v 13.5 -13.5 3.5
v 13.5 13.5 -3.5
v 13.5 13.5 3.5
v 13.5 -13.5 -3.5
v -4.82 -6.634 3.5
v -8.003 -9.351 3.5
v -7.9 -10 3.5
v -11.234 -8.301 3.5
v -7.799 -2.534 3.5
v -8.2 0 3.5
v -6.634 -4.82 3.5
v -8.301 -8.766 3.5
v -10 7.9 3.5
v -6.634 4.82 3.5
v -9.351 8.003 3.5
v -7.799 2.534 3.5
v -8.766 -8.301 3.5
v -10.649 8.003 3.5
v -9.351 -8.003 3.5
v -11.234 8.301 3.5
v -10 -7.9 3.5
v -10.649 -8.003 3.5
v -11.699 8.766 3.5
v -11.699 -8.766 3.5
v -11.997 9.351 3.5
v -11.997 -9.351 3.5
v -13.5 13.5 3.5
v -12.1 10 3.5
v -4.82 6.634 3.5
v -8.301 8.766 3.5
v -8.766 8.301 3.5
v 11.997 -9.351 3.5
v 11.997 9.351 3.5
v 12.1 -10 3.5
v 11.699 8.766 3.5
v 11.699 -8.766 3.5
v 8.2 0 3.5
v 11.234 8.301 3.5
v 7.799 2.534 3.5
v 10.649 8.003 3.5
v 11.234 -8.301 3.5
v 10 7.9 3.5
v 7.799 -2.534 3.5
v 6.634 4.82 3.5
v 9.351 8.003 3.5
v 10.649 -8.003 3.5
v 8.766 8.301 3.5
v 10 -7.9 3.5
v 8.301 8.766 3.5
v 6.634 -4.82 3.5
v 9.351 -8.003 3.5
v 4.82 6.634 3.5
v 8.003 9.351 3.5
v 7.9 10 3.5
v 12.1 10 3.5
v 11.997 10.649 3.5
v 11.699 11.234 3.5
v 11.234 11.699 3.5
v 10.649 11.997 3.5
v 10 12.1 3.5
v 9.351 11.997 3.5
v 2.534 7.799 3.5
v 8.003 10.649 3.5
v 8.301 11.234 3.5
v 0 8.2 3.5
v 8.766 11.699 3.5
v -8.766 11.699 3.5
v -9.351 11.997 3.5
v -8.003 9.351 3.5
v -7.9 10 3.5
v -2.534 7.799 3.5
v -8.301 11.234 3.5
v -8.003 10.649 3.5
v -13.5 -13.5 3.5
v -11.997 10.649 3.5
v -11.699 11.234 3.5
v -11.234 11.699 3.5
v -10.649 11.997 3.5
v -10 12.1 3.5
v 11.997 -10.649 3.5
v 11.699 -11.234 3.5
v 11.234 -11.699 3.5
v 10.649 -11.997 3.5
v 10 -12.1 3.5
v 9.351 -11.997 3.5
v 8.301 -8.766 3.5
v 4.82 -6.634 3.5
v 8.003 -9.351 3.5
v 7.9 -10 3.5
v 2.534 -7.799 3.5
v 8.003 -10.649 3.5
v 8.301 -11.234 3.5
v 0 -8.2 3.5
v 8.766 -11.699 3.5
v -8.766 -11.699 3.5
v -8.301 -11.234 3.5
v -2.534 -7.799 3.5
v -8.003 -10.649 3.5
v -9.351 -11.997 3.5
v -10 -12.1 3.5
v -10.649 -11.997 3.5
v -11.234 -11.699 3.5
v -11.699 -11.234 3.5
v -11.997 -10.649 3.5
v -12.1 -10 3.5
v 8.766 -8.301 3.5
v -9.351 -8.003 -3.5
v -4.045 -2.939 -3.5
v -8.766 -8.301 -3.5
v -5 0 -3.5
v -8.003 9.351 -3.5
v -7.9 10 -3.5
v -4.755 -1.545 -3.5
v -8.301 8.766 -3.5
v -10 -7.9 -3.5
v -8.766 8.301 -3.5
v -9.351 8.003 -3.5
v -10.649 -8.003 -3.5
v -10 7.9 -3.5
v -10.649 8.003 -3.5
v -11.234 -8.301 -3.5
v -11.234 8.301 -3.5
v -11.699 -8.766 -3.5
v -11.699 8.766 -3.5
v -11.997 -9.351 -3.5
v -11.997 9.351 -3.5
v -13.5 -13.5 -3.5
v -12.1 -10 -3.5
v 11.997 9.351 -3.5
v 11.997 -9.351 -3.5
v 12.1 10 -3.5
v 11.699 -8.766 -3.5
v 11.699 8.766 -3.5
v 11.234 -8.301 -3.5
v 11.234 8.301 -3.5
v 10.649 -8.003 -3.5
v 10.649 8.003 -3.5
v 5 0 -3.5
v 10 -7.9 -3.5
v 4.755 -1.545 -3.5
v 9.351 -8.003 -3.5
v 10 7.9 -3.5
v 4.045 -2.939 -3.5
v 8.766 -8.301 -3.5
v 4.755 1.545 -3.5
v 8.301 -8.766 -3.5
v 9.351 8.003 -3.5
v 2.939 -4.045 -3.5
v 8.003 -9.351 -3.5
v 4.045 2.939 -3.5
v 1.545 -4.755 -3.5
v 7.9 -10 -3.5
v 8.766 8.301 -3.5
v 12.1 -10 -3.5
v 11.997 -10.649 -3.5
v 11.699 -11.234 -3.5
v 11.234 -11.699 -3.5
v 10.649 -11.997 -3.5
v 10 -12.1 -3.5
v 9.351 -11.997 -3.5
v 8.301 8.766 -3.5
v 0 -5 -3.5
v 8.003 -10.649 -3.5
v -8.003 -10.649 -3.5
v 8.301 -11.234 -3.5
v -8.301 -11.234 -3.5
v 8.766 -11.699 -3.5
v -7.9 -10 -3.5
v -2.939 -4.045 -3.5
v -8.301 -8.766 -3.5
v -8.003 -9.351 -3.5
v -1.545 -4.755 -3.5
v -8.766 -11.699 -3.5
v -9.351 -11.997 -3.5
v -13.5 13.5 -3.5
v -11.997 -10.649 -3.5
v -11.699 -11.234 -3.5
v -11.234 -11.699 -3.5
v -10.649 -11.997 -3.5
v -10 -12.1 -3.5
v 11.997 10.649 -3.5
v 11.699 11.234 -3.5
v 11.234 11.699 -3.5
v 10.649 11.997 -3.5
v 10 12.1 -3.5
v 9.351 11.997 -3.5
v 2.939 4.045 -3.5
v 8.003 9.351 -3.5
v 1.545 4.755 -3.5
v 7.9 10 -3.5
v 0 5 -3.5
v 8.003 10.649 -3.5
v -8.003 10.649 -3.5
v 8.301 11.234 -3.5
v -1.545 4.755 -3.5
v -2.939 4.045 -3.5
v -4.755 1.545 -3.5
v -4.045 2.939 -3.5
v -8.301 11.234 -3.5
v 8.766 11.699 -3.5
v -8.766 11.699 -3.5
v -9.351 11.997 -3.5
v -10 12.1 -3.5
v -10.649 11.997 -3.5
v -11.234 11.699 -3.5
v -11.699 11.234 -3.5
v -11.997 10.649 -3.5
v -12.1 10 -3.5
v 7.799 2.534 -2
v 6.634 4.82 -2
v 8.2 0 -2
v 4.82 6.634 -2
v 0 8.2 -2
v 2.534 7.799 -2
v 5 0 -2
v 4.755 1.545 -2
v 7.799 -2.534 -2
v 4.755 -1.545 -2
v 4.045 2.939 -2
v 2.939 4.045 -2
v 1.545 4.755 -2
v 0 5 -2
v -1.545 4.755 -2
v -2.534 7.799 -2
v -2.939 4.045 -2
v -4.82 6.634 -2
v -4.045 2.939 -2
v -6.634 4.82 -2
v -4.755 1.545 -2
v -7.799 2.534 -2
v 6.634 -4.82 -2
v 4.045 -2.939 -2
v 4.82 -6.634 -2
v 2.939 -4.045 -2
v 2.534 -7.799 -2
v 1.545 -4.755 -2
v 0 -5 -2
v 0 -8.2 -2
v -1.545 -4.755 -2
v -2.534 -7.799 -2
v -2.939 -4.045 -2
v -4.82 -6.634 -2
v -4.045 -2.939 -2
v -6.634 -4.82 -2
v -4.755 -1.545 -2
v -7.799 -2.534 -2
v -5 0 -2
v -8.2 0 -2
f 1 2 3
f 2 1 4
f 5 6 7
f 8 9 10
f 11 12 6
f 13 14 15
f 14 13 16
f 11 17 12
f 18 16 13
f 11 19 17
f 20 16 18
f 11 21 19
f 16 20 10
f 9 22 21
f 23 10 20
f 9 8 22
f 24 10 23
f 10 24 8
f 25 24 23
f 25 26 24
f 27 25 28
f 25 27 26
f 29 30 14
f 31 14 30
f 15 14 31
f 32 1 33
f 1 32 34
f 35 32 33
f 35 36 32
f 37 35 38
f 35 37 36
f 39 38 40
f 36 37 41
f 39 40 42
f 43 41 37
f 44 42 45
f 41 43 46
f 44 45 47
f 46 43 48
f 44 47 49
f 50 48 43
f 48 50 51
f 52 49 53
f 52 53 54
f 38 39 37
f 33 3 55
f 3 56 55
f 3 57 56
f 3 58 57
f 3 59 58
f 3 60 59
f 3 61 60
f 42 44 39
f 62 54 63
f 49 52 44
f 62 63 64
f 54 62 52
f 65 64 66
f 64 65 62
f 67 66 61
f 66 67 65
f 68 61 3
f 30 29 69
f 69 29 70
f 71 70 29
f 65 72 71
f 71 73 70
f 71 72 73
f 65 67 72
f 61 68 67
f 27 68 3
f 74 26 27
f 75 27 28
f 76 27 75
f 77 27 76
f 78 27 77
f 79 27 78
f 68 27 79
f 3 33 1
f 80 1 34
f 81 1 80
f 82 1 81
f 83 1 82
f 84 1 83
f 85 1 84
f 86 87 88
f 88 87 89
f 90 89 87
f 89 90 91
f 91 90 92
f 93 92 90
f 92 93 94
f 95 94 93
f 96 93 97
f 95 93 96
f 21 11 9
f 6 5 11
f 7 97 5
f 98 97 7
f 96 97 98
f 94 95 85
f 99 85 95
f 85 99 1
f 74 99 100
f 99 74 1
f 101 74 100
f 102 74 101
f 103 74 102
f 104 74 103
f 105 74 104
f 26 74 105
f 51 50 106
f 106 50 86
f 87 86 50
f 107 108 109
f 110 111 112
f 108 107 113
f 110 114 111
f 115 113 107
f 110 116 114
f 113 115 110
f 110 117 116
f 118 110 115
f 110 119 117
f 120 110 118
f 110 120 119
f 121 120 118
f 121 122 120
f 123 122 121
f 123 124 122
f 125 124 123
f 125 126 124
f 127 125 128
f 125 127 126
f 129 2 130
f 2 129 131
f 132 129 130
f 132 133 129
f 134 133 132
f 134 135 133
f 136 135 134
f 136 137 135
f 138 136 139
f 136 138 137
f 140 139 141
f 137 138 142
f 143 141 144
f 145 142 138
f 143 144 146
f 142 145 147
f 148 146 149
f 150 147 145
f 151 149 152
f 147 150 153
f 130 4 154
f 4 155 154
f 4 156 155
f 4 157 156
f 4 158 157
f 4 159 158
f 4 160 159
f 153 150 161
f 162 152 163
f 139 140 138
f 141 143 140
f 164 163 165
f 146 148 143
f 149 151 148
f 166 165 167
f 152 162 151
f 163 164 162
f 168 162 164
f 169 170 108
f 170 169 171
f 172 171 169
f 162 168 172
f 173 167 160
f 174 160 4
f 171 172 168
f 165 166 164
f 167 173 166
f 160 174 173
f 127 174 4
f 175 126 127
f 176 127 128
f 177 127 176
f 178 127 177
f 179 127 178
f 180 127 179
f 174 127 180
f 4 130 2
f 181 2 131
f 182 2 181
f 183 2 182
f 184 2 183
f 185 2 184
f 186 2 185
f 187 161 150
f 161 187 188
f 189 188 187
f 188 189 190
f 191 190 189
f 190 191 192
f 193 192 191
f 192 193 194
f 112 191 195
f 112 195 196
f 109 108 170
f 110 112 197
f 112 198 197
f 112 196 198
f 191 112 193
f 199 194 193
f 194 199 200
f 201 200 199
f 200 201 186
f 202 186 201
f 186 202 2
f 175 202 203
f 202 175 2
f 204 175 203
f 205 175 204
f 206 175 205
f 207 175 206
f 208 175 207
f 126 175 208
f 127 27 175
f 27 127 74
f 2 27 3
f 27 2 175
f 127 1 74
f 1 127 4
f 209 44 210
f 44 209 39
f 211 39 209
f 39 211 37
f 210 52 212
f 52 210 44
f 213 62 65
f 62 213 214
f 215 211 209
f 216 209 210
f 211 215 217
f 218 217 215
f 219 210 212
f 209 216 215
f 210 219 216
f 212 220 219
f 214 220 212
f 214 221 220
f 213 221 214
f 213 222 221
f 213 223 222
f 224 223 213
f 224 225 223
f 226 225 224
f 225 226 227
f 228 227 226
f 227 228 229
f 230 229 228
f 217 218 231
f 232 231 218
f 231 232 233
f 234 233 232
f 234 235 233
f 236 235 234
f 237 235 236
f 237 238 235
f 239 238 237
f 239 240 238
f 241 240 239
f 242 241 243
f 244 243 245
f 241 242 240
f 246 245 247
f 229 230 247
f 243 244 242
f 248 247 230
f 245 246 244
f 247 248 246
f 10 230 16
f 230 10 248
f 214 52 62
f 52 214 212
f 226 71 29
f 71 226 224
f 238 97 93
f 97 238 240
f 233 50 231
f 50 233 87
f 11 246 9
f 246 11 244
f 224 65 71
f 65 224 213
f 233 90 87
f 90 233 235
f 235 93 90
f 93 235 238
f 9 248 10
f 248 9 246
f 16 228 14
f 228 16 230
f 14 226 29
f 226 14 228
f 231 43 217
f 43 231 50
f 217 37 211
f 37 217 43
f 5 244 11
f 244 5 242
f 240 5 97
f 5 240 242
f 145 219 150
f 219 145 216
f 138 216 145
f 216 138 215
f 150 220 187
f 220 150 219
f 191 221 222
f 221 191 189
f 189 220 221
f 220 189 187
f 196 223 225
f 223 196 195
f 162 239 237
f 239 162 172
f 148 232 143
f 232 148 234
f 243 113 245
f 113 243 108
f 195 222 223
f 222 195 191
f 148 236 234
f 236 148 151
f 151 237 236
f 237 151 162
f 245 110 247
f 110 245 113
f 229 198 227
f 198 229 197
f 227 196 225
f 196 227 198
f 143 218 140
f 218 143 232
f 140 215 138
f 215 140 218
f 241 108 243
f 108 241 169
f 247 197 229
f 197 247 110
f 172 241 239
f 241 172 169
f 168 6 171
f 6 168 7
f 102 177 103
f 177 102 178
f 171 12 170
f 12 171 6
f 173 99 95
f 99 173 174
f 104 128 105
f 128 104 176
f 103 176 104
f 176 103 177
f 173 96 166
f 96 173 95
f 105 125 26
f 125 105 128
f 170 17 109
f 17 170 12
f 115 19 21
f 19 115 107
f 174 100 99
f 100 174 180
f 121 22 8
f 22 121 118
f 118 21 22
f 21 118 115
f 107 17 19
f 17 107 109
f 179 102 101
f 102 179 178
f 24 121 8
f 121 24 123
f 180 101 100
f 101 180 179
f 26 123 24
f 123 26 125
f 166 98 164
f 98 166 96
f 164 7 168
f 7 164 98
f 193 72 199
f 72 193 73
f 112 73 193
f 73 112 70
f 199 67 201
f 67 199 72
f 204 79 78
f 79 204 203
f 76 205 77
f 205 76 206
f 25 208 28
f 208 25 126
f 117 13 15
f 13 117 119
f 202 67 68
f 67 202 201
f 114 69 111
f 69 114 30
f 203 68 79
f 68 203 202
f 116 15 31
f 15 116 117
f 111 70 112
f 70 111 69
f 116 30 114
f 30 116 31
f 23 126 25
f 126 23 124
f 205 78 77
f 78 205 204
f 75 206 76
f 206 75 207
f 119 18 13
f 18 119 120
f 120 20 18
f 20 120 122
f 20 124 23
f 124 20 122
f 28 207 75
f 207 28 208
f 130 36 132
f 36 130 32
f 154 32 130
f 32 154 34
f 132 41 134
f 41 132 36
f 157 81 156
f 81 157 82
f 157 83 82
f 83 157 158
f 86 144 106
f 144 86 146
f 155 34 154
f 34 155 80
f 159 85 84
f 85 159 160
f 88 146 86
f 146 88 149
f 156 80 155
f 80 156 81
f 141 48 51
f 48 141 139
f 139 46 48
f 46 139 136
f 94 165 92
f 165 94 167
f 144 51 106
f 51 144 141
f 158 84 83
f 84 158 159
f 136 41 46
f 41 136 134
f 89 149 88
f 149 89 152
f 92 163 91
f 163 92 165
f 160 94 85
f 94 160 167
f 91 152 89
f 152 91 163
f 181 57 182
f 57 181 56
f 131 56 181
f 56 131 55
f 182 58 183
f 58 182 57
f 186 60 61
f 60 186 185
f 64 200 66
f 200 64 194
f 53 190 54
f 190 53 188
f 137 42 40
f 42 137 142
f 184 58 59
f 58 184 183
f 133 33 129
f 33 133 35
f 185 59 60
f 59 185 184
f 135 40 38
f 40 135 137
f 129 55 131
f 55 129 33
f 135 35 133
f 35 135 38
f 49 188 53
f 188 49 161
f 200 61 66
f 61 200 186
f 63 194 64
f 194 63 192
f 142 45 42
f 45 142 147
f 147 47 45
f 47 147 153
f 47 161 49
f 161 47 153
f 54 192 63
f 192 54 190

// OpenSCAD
// holder for M5 bearing with 3x4 plate
$fn = 20;
d_o = 16.0 + 0.4;
d_o1 = 10.0;
r_ho = 2.1;

z_b = 6;
z_1 = 1.0;
z_a = z_b + z_1;

x_1 = 27;
y_1 = 27;

step_xy = 10;

module m_hole( i, j )
{
  translate([ i*step_xy, j*step_xy,z_1])  cylinder(h=2*z_a, r = r_ho, center = true );
}

module bearing_box()
{
  difference() {
    cube([x_1,y_1,z_a], true );
    translate([0,0,z_1])
      cylinder(h=z_b, r = d_o/2.0, center = true );
    translate([0,0,z_1])
      cylinder(h=2*z_a, r = d_o1/2.0, center = true );

    m_hole( -1, -1 );
    m_hole( -1,  1 );
    m_hole(  1, -1 );
    m_hole(  1,  1 );
    // m_hole(  0,  1 );
  }

}

bearing_box();
